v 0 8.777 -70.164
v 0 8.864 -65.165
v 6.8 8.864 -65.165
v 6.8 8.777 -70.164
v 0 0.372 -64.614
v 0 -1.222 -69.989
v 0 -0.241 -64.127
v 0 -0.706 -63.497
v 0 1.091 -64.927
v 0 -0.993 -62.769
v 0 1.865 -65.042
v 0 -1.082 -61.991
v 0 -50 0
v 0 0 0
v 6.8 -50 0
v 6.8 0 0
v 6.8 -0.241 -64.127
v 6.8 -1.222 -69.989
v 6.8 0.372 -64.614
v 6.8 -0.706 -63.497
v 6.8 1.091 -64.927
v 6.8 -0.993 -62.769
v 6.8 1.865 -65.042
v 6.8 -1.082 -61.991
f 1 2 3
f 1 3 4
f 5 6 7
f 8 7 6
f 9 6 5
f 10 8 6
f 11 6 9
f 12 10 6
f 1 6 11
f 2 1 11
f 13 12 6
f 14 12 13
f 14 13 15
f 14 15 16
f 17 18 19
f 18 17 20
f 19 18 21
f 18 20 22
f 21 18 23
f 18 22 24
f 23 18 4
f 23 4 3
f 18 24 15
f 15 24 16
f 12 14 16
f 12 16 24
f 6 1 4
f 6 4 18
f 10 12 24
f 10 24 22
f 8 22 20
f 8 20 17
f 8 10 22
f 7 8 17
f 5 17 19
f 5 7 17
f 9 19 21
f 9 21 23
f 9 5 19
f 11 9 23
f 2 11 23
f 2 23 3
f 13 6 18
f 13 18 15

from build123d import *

# Parameters (mm, degrees)
SALIENTE_EXTRUIR1_DEPTH = 6.8


with BuildPart() as part:
    # Croquis1 → Saliente-Extruir1 (new body)
    with BuildSketch(Plane(origin=(0, 0, 0), x_dir=(0, 0, -1), z_dir=(1, 0, 0))):
        with BuildLine():
            Line((65.042457404, 1.865136667), (65.16462425, 8.864070533))
            Line((65.16462425, 8.864070533), (70.163862725, 8.776808501))
            Line((70.163862725, 8.776808501), (69.989338661, -1.221668451))
            Line((69.989338661, -1.221668451), (0, -50))
            Line((0, -50), (0, 0))
            Line((0, 0), (61.9905571, -1.082049199))
            ThreePointArc((61.9905571, -1.082049199), (64.12688943, -0.240525515), (65.042457404, 1.865136667))
        make_face()
    extrude(amount=SALIENTE_EXTRUIR1_DEPTH)


solid = part.part
